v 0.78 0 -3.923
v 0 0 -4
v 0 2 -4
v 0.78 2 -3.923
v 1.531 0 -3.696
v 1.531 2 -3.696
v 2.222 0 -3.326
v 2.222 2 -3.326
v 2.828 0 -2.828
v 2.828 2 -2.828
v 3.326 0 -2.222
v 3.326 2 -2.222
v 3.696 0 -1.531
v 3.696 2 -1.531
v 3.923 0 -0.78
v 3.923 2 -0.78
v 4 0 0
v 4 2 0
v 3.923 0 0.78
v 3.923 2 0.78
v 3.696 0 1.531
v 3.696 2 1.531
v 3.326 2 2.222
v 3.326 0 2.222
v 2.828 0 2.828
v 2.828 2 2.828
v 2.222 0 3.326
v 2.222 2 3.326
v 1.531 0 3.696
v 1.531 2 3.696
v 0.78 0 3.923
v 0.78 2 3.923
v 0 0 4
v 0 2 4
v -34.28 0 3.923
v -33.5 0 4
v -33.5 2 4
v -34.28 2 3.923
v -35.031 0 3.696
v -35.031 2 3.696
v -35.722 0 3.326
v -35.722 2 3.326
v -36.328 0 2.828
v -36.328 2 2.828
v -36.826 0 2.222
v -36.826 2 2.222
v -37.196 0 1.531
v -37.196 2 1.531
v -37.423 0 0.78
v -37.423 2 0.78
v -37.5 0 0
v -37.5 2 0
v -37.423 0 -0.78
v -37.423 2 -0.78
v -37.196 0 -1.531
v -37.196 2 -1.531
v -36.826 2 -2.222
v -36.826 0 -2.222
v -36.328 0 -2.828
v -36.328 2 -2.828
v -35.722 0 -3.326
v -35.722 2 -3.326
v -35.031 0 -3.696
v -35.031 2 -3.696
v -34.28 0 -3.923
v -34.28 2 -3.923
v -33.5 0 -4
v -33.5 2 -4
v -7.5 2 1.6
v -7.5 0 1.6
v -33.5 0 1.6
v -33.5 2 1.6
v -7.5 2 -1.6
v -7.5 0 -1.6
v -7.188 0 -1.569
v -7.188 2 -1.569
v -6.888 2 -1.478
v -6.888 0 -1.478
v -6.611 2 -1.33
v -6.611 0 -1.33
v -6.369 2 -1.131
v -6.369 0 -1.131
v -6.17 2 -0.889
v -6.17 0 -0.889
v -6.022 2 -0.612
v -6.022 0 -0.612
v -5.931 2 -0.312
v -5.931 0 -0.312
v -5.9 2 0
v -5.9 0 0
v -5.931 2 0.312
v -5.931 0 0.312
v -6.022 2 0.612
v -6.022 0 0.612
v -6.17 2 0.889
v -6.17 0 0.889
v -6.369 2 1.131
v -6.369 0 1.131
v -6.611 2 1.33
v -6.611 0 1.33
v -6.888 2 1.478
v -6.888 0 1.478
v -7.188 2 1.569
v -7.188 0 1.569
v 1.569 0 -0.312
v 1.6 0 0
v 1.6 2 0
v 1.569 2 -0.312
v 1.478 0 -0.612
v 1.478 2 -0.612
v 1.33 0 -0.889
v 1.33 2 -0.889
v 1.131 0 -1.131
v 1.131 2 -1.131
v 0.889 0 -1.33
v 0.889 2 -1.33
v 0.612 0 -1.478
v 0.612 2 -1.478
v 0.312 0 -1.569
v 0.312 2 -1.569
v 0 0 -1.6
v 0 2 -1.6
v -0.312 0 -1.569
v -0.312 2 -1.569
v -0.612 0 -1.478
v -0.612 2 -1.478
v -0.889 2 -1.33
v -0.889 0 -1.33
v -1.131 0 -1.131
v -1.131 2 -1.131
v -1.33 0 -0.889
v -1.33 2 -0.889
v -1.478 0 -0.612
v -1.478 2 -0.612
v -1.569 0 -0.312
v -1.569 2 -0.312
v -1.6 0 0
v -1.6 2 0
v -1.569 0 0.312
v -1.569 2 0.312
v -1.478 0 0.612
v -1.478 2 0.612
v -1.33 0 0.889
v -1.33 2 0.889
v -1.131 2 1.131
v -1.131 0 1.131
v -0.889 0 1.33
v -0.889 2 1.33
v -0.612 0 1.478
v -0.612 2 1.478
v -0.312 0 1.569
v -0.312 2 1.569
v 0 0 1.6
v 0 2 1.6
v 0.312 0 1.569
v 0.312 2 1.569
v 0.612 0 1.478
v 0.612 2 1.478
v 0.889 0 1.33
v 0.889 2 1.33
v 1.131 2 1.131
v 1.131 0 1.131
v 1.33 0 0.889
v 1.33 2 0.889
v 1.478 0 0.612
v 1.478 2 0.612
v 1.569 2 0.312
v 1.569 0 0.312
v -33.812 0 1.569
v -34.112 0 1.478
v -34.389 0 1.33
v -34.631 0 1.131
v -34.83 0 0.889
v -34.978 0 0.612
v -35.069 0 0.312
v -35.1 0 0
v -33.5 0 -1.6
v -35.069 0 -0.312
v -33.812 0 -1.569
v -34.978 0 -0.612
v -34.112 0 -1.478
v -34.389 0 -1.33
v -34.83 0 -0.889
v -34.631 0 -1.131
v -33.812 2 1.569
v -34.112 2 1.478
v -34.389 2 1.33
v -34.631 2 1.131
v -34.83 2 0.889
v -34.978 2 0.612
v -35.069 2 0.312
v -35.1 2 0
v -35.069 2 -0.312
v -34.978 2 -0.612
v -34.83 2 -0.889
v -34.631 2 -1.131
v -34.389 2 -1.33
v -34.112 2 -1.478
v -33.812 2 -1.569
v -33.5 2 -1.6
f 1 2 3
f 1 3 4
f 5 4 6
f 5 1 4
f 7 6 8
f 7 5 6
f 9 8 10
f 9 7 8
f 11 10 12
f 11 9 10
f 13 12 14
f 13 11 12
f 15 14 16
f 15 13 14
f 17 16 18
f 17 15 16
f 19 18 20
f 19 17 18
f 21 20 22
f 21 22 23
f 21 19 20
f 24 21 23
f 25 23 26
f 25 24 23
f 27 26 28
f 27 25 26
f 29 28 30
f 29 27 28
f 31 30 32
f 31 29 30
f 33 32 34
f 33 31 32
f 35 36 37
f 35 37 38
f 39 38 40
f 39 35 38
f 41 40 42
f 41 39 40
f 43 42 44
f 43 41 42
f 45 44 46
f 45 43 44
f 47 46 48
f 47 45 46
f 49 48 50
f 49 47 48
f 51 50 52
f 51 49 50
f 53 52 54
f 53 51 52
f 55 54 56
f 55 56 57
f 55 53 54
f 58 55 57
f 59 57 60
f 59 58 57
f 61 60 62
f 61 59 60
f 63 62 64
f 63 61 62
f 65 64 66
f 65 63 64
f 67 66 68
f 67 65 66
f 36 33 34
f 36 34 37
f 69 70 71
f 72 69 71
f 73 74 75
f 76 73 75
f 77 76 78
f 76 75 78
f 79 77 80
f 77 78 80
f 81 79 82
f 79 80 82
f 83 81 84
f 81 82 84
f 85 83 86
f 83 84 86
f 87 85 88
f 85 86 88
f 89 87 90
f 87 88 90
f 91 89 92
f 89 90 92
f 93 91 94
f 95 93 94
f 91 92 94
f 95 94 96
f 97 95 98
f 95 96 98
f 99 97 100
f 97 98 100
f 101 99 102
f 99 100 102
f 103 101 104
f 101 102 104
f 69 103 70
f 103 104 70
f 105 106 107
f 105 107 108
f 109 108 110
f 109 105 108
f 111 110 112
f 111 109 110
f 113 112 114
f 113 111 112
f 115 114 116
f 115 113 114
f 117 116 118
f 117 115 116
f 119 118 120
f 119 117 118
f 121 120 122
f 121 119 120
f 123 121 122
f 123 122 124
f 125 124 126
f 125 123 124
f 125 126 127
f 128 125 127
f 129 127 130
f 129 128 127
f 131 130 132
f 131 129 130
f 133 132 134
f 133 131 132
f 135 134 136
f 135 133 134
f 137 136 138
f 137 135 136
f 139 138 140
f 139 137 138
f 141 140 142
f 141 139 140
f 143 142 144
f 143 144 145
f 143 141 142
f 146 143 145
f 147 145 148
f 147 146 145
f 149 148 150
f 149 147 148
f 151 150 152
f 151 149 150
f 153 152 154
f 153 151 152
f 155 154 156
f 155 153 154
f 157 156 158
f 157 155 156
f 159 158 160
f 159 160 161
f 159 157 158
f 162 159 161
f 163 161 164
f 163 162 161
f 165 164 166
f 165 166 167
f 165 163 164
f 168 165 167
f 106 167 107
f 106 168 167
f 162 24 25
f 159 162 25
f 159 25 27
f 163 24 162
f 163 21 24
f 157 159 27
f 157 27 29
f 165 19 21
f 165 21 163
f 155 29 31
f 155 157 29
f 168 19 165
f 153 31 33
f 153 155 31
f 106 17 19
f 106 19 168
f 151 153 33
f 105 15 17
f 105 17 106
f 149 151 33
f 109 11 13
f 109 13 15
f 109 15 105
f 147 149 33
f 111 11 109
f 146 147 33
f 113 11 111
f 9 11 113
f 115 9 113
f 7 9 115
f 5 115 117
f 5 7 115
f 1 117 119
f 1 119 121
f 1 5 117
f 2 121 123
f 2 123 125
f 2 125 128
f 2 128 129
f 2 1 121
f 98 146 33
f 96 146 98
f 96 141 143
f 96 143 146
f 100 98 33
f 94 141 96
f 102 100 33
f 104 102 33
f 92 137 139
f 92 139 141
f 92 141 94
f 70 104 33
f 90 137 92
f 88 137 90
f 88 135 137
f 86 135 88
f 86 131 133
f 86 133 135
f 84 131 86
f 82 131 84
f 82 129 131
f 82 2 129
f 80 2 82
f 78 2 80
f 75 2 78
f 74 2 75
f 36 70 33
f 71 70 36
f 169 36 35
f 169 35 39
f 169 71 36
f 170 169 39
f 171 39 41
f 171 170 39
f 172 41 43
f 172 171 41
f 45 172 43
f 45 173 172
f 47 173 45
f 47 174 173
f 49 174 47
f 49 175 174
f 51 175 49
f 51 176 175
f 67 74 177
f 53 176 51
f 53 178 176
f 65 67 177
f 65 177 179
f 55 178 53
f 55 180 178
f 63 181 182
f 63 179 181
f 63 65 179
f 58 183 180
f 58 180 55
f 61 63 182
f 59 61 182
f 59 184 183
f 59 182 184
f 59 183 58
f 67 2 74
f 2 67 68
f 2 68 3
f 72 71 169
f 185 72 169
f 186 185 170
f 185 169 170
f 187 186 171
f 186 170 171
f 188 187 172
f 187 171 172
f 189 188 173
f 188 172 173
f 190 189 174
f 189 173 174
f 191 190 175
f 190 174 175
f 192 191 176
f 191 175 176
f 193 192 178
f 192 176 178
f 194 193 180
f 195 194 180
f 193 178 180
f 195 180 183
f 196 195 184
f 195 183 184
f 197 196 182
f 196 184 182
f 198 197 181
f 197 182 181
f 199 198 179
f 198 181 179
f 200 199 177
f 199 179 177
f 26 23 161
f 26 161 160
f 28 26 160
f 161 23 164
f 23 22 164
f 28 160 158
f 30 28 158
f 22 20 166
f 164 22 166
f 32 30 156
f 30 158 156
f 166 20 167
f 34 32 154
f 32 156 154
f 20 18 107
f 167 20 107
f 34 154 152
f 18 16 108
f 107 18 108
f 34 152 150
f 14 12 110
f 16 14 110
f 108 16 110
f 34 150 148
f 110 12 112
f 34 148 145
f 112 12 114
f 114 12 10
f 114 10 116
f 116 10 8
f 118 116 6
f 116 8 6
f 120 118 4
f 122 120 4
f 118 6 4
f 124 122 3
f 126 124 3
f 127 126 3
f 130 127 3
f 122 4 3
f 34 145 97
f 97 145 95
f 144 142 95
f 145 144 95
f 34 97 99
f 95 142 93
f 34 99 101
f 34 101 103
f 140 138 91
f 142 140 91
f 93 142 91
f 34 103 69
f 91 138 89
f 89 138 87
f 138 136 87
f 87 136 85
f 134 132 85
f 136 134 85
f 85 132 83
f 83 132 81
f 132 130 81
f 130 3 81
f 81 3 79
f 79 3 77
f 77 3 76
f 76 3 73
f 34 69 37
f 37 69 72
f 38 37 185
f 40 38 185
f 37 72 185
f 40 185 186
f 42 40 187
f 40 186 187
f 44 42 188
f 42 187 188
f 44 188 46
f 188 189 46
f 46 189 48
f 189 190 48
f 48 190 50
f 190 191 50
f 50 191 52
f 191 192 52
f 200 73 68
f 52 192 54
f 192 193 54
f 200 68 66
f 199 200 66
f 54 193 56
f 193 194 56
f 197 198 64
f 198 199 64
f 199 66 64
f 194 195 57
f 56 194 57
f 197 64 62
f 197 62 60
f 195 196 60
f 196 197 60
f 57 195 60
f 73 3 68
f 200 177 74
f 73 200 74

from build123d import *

# Parameters (mm, degrees)
SKETCH_1_R      = 1.6
EXTRUDE_1_DEPTH = 2


with BuildPart() as part:
    # 草图1 → 凸台-拉伸1 (new body)
    with BuildSketch(Plane(origin=(0, 0, 0), x_dir=(1, 0, 0), z_dir=(0, 1, 0))):
        with BuildLine():
            Line((0, -4), (-33.5, -4))
            ThreePointArc((-33.5, -4), (-37.5, 0), (-33.5, 4))
            Line((-33.5, 4), (0, 4))
            ThreePointArc((0, 4), (4, 0), (0, -4))
        make_face()
        Circle(SKETCH_1_R, mode=Mode.SUBTRACT)
        with BuildLine():
            Line((-33.5, 1.6), (-7.5, 1.6))
            ThreePointArc((-7.5, 1.6), (-5.9, 0), (-7.5, -1.6))
            Line((-7.5, -1.6), (-33.5, -1.6))
            ThreePointArc((-33.5, -1.6), (-35.1, 0), (-33.5, 1.6))
        make_face(mode=Mode.SUBTRACT)
    extrude(amount=EXTRUDE_1_DEPTH)


solid = part.part
